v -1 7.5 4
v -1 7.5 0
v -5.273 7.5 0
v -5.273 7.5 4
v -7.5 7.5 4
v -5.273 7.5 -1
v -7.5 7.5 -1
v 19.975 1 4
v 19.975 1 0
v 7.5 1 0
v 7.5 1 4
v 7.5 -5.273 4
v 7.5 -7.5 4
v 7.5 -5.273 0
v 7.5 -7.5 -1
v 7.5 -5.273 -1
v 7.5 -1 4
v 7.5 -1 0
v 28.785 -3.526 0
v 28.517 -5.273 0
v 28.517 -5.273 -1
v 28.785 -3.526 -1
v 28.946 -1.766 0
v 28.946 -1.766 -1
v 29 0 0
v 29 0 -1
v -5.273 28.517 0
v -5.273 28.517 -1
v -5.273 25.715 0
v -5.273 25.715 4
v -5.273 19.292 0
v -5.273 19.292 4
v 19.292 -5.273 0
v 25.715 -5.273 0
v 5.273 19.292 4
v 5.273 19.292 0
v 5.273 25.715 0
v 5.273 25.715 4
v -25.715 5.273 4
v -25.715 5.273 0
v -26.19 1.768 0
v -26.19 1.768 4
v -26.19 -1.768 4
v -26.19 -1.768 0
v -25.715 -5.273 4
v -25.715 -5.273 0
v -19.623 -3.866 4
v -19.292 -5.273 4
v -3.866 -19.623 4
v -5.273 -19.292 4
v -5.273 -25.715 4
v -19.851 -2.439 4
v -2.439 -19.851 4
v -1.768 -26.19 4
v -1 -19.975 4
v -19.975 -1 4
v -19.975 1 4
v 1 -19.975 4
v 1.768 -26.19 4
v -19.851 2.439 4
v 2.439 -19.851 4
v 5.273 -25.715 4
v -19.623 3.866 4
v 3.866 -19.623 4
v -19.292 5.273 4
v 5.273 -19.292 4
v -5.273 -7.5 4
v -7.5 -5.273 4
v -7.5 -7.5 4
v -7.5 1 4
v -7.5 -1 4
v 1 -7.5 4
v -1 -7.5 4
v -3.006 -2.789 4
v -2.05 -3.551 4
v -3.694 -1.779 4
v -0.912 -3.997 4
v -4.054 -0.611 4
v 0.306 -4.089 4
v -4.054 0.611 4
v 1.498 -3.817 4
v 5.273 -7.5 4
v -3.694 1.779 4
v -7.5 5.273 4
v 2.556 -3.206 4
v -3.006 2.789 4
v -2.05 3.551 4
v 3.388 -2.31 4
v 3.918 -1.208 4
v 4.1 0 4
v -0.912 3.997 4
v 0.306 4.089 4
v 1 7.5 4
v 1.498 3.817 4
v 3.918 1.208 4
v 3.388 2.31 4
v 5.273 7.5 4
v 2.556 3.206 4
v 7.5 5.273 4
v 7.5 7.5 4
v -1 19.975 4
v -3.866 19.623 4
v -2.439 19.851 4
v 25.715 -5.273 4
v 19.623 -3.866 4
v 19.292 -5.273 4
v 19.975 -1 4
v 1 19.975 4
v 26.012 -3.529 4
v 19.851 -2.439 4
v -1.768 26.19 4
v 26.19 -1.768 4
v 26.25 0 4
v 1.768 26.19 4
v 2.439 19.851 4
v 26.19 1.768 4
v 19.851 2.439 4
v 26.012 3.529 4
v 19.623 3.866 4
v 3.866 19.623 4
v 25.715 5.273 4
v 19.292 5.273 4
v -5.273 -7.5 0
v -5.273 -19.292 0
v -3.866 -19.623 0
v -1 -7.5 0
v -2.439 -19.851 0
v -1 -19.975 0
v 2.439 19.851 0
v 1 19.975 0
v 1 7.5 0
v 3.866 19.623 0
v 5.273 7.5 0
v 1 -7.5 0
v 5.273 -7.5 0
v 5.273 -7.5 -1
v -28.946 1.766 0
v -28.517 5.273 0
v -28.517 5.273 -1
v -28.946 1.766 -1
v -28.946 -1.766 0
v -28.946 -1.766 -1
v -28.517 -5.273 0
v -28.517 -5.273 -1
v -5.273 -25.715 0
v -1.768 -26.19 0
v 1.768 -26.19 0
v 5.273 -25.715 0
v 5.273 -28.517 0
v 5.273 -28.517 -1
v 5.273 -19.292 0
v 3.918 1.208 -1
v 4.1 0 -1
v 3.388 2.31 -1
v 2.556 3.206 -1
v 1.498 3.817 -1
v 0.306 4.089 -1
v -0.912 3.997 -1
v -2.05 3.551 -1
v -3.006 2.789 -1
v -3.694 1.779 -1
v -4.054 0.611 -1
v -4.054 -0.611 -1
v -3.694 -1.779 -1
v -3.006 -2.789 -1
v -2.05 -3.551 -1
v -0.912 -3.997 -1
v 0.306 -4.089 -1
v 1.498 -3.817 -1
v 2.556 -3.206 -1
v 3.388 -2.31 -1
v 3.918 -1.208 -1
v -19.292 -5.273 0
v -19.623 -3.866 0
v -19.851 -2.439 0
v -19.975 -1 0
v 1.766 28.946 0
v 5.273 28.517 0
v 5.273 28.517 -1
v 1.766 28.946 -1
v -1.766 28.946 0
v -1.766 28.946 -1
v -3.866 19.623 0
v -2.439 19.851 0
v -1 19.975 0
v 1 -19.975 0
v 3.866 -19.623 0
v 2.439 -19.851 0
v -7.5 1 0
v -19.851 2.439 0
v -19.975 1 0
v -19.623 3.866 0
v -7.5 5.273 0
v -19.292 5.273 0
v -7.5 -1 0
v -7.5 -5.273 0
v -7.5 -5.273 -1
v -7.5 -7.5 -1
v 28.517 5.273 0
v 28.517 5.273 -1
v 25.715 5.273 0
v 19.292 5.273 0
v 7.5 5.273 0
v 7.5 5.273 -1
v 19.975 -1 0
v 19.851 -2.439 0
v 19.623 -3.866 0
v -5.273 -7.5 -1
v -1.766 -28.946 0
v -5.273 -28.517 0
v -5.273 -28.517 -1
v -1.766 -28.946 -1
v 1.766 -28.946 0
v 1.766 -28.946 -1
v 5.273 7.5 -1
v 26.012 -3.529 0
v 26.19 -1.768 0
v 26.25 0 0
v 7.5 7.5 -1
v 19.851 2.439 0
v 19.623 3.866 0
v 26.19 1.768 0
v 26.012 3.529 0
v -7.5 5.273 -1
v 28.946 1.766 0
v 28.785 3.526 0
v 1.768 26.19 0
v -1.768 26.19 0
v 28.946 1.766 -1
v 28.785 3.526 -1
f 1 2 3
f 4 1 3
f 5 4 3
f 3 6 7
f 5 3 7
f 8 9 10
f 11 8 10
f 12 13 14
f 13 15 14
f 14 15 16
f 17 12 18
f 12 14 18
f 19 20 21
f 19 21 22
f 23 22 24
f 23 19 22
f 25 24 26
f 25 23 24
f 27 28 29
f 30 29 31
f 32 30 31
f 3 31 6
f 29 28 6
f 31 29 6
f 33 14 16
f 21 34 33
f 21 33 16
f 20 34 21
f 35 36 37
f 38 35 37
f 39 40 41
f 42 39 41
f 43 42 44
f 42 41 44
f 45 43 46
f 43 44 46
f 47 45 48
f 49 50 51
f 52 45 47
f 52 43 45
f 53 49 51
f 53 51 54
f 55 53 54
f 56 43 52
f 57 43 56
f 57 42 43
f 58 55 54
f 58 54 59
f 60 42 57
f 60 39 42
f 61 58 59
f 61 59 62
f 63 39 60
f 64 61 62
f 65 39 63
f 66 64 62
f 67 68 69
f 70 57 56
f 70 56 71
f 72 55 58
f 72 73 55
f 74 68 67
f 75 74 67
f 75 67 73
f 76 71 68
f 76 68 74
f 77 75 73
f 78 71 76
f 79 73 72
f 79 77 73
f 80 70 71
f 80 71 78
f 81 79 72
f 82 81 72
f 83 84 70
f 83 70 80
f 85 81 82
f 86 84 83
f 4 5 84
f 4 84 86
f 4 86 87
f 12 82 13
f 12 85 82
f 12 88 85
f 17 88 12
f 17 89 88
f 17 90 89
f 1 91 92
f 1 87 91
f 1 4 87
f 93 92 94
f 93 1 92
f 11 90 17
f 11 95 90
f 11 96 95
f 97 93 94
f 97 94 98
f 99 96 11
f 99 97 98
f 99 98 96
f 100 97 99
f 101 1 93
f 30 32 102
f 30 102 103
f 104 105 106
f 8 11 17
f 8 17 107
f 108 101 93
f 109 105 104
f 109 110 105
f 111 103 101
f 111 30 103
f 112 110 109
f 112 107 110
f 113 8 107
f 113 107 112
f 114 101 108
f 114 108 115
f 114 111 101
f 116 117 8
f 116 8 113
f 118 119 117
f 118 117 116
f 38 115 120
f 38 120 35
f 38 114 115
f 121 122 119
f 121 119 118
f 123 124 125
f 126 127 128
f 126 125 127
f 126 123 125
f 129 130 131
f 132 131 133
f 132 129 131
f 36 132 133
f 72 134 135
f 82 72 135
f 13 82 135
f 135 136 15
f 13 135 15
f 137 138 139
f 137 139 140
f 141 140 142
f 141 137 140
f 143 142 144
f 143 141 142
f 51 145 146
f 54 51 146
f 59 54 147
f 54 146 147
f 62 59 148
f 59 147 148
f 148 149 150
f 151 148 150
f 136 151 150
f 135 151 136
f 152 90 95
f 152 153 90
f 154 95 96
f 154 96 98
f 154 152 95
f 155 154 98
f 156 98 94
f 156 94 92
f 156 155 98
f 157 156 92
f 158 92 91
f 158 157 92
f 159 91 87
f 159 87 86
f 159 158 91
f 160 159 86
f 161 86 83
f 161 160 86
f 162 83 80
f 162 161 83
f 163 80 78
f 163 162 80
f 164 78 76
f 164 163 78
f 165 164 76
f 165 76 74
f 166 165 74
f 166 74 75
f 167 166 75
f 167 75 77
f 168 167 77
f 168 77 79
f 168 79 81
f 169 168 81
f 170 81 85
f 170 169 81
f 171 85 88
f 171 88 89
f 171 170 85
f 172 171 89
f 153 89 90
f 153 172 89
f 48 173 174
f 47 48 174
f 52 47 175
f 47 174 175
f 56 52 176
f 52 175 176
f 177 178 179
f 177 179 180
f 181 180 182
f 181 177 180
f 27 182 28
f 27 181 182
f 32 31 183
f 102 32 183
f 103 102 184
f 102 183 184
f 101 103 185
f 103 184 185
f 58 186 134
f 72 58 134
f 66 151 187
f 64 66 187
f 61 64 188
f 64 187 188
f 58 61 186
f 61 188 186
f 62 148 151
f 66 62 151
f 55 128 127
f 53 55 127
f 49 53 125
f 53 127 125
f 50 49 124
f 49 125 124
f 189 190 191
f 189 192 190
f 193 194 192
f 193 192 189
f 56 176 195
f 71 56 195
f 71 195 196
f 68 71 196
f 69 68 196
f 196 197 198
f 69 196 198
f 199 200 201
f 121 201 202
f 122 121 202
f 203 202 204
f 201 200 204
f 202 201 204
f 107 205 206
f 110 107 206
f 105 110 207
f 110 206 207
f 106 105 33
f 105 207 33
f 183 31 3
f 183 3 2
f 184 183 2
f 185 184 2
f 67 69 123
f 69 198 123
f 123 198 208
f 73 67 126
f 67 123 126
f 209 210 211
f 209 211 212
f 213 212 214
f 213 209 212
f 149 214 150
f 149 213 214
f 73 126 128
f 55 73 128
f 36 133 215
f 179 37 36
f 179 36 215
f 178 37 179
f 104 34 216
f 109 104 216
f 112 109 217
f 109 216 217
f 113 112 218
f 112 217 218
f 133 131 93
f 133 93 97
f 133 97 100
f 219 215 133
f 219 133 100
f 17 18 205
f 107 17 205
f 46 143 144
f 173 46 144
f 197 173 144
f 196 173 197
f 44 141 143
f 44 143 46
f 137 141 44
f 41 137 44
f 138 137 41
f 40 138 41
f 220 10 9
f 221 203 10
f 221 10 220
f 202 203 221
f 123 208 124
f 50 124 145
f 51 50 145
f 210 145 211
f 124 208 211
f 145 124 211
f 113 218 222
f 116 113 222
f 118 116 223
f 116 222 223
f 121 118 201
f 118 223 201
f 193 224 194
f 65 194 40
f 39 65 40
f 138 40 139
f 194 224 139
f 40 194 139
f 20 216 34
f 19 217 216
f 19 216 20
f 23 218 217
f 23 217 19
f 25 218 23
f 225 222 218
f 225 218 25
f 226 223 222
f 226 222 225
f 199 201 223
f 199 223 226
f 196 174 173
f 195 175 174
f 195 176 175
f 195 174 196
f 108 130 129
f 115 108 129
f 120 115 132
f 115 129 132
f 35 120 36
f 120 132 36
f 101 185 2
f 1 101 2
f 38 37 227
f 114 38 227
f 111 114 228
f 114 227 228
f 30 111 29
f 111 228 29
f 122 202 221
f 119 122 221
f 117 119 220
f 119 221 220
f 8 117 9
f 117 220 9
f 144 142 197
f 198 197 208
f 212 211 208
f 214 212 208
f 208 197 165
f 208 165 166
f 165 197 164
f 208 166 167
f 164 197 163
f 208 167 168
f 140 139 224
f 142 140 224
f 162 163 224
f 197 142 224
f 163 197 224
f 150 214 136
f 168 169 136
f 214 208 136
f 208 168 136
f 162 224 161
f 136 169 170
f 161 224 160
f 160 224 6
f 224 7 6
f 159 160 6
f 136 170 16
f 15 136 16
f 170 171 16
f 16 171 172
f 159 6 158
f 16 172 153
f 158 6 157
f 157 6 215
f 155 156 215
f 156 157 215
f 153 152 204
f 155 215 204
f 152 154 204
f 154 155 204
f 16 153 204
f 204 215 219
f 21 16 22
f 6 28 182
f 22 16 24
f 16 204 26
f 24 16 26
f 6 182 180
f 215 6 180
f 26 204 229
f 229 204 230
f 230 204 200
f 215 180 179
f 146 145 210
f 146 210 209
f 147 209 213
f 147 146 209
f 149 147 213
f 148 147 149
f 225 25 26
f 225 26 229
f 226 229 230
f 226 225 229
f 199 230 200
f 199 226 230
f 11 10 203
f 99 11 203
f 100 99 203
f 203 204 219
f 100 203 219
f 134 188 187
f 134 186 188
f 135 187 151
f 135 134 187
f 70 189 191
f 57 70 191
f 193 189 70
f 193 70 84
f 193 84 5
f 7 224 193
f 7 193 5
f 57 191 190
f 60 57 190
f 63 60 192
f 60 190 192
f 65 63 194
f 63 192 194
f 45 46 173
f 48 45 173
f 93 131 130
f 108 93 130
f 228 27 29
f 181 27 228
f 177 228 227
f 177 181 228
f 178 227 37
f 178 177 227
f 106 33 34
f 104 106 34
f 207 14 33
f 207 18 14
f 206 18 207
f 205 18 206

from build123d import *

# Parameters (mm, degrees)
F0_R     = 4.1
F0_W     = 2.2272727273
F0_H     = 2.2272727273
F1_DEPTH = 1
F2_DEPTH = 4


with BuildPart() as f1:
    # F0 (on Top) → F1 (new body)
    with BuildSketch(Plane.XY):
        with BuildLine():
            Line((5.2727272727, 19.292442746), (5.2727272727, 25.7149926523))
            ThreePointArc((5.2727272727, 25.7149926523), (0, 26.25), (-5.2727272727, 25.7149926523))
            Line((-5.2727272727, 25.7149926523), (-5.2727272727, 19.292442746))
            ThreePointArc((-5.2727272727, 19.292442746), (-3.1548760073, 19.7496014486), (-1, 19.9749843554))
            ThreePointArc((-1, 19.9749843554), (0, 20), (1, 19.9749843554))
            ThreePointArc((1, 19.9749843554), (3.1548760073, 19.7496014486), (5.2727272727, 19.292442746))
        make_face()
        with BuildLine():
            ThreePointArc((-25.7149926523, -5.2727272727), (-26.25, 0), (-25.7149926523, 5.2727272727))
            Line((-25.7149926523, 5.2727272727), (-28.516632815, 5.2727272727))
            ThreePointArc((-28.516632815, 5.2727272727), (-29, 0), (-28.516632815, -5.2727272727))
            Line((-28.516632815, -5.2727272727), (-25.7149926523, -5.2727272727))
        make_face()
        with BuildLine():
            ThreePointArc((-5.2727272727, 25.7149926523), (0, 26.25), (5.2727272727, 25.7149926523))
            Line((5.2727272727, 25.7149926523), (5.2727272727, 28.516632815))
            ThreePointArc((5.2727272727, 28.516632815), (0, 29), (-5.2727272727, 28.516632815))
            Line((-5.2727272727, 28.516632815), (-5.2727272727, 25.7149926523))
        make_face()
        with BuildLine():
            ThreePointArc((25.7149926523, 5.2727272727), (26.1159056623, 2.6499002696), (26.25, 0))
            ThreePointArc((26.25, 0), (26.1159056623, -2.6499002696), (25.7149926523, -5.2727272727))
            Line((25.7149926523, -5.2727272727), (28.516632815, -5.2727272727))
            ThreePointArc((28.516632815, -5.2727272727), (28.8789053778, -2.6474183995), (29, 0))
            ThreePointArc((29, 0), (28.8789053778, 2.6474183995), (28.516632815, 5.2727272727))
            Line((28.516632815, 5.2727272727), (25.7149926523, 5.2727272727))
        make_face()
        with BuildLine():
            Line((5.2727272727, -28.516632815), (5.2727272727, -25.7149926523))
            ThreePointArc((5.2727272727, -25.7149926523), (0, -26.25), (-5.2727272727, -25.7149926523))
            Line((-5.2727272727, -25.7149926523), (-5.2727272727, -28.516632815))
            ThreePointArc((-5.2727272727, -28.516632815), (0, -29), (5.2727272727, -28.516632815))
        make_face()
        with BuildLine():
            Line((-7.5, 5.2727272727), (-19.292442746, 5.2727272727))
            ThreePointArc((-19.292442746, 5.2727272727), (-19.7496014486, 3.1548760073), (-19.9749843554, 1))
            Line((-19.9749843554, 1), (-7.5, 1))
            Line((-7.5, 1), (-7.5, 5.2727272727))
        make_face()
        Polygon((7.5, 1), (7.5, 5.2727272727), (5.2727272727, 5.2727272727), (5.2727272727, 7.5), (1, 7.5), (-1, 7.5), (-5.2727272727, 7.5), (-5.2727272727, 5.2727272727), (-7.5, 5.2727272727), (-7.5, 1), (-7.5, -1), (-7.5, -5.2727272727), (-5.2727272727, -5.2727272727), (-5.2727272727, -7.5), (-1, -7.5), (1, -7.5), (5.2727272727, -7.5), (5.2727272727, -5.2727272727), (7.5, -5.2727272727), (7.5, -1), align=None)
        Circle(F0_R, mode=Mode.SUBTRACT)
        with BuildLine():
            ThreePointArc((-1, 19.9749843554), (-3.1548760073, 19.7496014486), (-5.2727272727, 19.292442746))
            Line((-5.2727272727, 19.292442746), (-5.2727272727, 7.5))
            Line((-5.2727272727, 7.5), (-1, 7.5))
            Line((-1, 7.5), (-1, 19.9749843554))
        make_face()
        with BuildLine():
            ThreePointArc((19.9749843554, 1), (19.7496014486, 3.1548760073), (19.292442746, 5.2727272727))
            Line((19.292442746, 5.2727272727), (7.5, 5.2727272727))
            Line((7.5, 5.2727272727), (7.5, 1))
            Line((7.5, 1), (19.9749843554, 1))
        make_face()
        with BuildLine():
            ThreePointArc((25.7149926523, -5.2727272727), (26.1159056623, -2.6499002696), (26.25, 0))
            ThreePointArc((26.25, 0), (26.1159056623, 2.6499002696), (25.7149926523, 5.2727272727))
            Line((25.7149926523, 5.2727272727), (19.292442746, 5.2727272727))
            ThreePointArc((19.292442746, 5.2727272727), (19.7496014486, 3.1548760073), (19.9749843554, 1))
            ThreePointArc((19.9749843554, 1), (19.9937451108, 0.5001564212), (20, 0))
            ThreePointArc((20, 0), (19.9937451108, -0.5001564212), (19.9749843554, -1))
            ThreePointArc((19.9749843554, -1), (19.7496014486, -3.1548760073), (19.292442746, -5.2727272727))
            Line((19.292442746, -5.2727272727), (25.7149926523, -5.2727272727))
        make_face()
        with BuildLine():
            Line((-5.2727272727, -7.5), (-5.2727272727, -19.292442746))
            ThreePointArc((-5.2727272727, -19.292442746), (-3.1548760073, -19.7496014486), (-1, -19.9749843554))
            Line((-1, -19.9749843554), (-1, -7.5))
            Line((-1, -7.5), (-5.2727272727, -7.5))
        make_face()
        with BuildLine():
            ThreePointArc((-5.2727272727, -25.7149926523), (0, -26.25), (5.2727272727, -25.7149926523))
            Line((5.2727272727, -25.7149926523), (5.2727272727, -19.292442746))
            ThreePointArc((5.2727272727, -19.292442746), (3.1548760073, -19.7496014486), (1, -19.9749843554))
            ThreePointArc((1, -19.9749843554), (0, -20), (-1, -19.9749843554))
            ThreePointArc((-1, -19.9749843554), (-3.1548760073, -19.7496014486), (-5.2727272727, -19.292442746))
            Line((-5.2727272727, -19.292442746), (-5.2727272727, -25.7149926523))
        make_face()
        with BuildLine():
            Line((-19.292442746, 5.2727272727), (-25.7149926523, 5.2727272727))
            ThreePointArc((-25.7149926523, 5.2727272727), (-26.25, 0), (-25.7149926523, -5.2727272727))
            Line((-25.7149926523, -5.2727272727), (-19.292442746, -5.2727272727))
            ThreePointArc((-19.292442746, -5.2727272727), (-19.7496014486, -3.1548760073), (-19.9749843554, -1))
            ThreePointArc((-19.9749843554, -1), (-20, 0), (-19.9749843554, 1))
            ThreePointArc((-19.9749843554, 1), (-19.7496014486, 3.1548760073), (-19.292442746, 5.2727272727))
        make_face()
        with Locations((-6.3863636364, 6.3863636364)):
            Rectangle(F0_W, F0_H)
        with Locations((-6.3863636364, -6.3863636364)):
            Rectangle(F0_W, F0_H)
        with Locations((6.3863636364, -6.3863636364)):
            Rectangle(F0_W, F0_H)
        with Locations((6.3863636364, 6.3863636364)):
            Rectangle(F0_W, F0_H)
        with BuildLine():
            ThreePointArc((20, 0), (19.9937451108, 0.5001564212), (19.9749843554, 1))
            Line((19.9749843554, 1), (7.5, 1))
            Line((7.5, 1), (7.5, -1))
            Line((7.5, -1), (19.9749843554, -1))
            ThreePointArc((19.9749843554, -1), (19.9937451108, -0.5001564212), (20, 0))
        make_face()
        with BuildLine():
            Line((7.5, -5.2727272727), (19.292442746, -5.2727272727))
            ThreePointArc((19.292442746, -5.2727272727), (19.7496014486, -3.1548760073), (19.9749843554, -1))
            Line((19.9749843554, -1), (7.5, -1))
            Line((7.5, -1), (7.5, -5.2727272727))
        make_face()
        with BuildLine():
            ThreePointArc((-19.9749843554, -1), (-19.7496014486, -3.1548760073), (-19.292442746, -5.2727272727))
            Line((-19.292442746, -5.2727272727), (-7.5, -5.2727272727))
            Line((-7.5, -5.2727272727), (-7.5, -1))
            Line((-7.5, -1), (-19.9749843554, -1))
        make_face()
        with BuildLine():
            Line((-7.5, 1), (-19.9749843554, 1))
            ThreePointArc((-19.9749843554, 1), (-20, 0), (-19.9749843554, -1))
            Line((-19.9749843554, -1), (-7.5, -1))
            Line((-7.5, -1), (-7.5, 1))
        make_face()
        with BuildLine():
            Line((1, 7.5), (1, 19.9749843554))
            ThreePointArc((1, 19.9749843554), (0, 20), (-1, 19.9749843554))
            Line((-1, 19.9749843554), (-1, 7.5))
            Line((-1, 7.5), (1, 7.5))
        make_face()
        with BuildLine():
            Line((5.2727272727, 7.5), (5.2727272727, 19.292442746))
            ThreePointArc((5.2727272727, 19.292442746), (3.1548760073, 19.7496014486), (1, 19.9749843554))
            Line((1, 19.9749843554), (1, 7.5))
            Line((1, 7.5), (5.2727272727, 7.5))
        make_face()
        with BuildLine():
            ThreePointArc((1, -19.9749843554), (3.1548760073, -19.7496014486), (5.2727272727, -19.292442746))
            Line((5.2727272727, -19.292442746), (5.2727272727, -7.5))
            Line((5.2727272727, -7.5), (1, -7.5))
            Line((1, -7.5), (1, -19.9749843554))
        make_face()
        with BuildLine():
            ThreePointArc((-1, -19.9749843554), (0, -20), (1, -19.9749843554))
            Line((1, -19.9749843554), (1, -7.5))
            Line((1, -7.5), (-1, -7.5))
            Line((-1, -7.5), (-1, -19.9749843554))
        make_face()
    extrude(amount=-F1_DEPTH)

    # F0 (on Top) → F2 (join)
    with BuildSketch(Plane.XY):
        with BuildLine():
            ThreePointArc((25.7149926523, -5.2727272727), (26.1159056623, -2.6499002696), (26.25, 0))
            ThreePointArc((26.25, 0), (26.1159056623, 2.6499002696), (25.7149926523, 5.2727272727))
            Line((25.7149926523, 5.2727272727), (19.292442746, 5.2727272727))
            ThreePointArc((19.292442746, 5.2727272727), (19.7496014486, 3.1548760073), (19.9749843554, 1))
            ThreePointArc((19.9749843554, 1), (19.9937451108, 0.5001564212), (20, 0))
            ThreePointArc((20, 0), (19.9937451108, -0.5001564212), (19.9749843554, -1))
            ThreePointArc((19.9749843554, -1), (19.7496014486, -3.1548760073), (19.292442746, -5.2727272727))
            Line((19.292442746, -5.2727272727), (25.7149926523, -5.2727272727))
        make_face()
        with BuildLine():
            Line((5.2727272727, 19.292442746), (5.2727272727, 25.7149926523))
            ThreePointArc((5.2727272727, 25.7149926523), (0, 26.25), (-5.2727272727, 25.7149926523))
            Line((-5.2727272727, 25.7149926523), (-5.2727272727, 19.292442746))
            ThreePointArc((-5.2727272727, 19.292442746), (-3.1548760073, 19.7496014486), (-1, 19.9749843554))
            ThreePointArc((-1, 19.9749843554), (0, 20), (1, 19.9749843554))
            ThreePointArc((1, 19.9749843554), (3.1548760073, 19.7496014486), (5.2727272727, 19.292442746))
        make_face()
        with BuildLine():
            Line((-19.292442746, 5.2727272727), (-25.7149926523, 5.2727272727))
            ThreePointArc((-25.7149926523, 5.2727272727), (-26.25, 0), (-25.7149926523, -5.2727272727))
            Line((-25.7149926523, -5.2727272727), (-19.292442746, -5.2727272727))
            ThreePointArc((-19.292442746, -5.2727272727), (-19.7496014486, -3.1548760073), (-19.9749843554, -1))
            ThreePointArc((-19.9749843554, -1), (-20, 0), (-19.9749843554, 1))
            ThreePointArc((-19.9749843554, 1), (-19.7496014486, 3.1548760073), (-19.292442746, 5.2727272727))
        make_face()
        with BuildLine():
            ThreePointArc((-5.2727272727, -25.7149926523), (0, -26.25), (5.2727272727, -25.7149926523))
            Line((5.2727272727, -25.7149926523), (5.2727272727, -19.292442746))
            ThreePointArc((5.2727272727, -19.292442746), (3.1548760073, -19.7496014486), (1, -19.9749843554))
            ThreePointArc((1, -19.9749843554), (0, -20), (-1, -19.9749843554))
            ThreePointArc((-1, -19.9749843554), (-3.1548760073, -19.7496014486), (-5.2727272727, -19.292442746))
            Line((-5.2727272727, -19.292442746), (-5.2727272727, -25.7149926523))
        make_face()
        with BuildLine():
            Line((1, 7.5), (1, 19.9749843554))
            ThreePointArc((1, 19.9749843554), (0, 20), (-1, 19.9749843554))
            Line((-1, 19.9749843554), (-1, 7.5))
            Line((-1, 7.5), (1, 7.5))
        make_face()
        with BuildLine():
            Line((-7.5, 1), (-19.9749843554, 1))
            ThreePointArc((-19.9749843554, 1), (-20, 0), (-19.9749843554, -1))
            Line((-19.9749843554, -1), (-7.5, -1))
            Line((-7.5, -1), (-7.5, 1))
        make_face()
        with BuildLine():
            ThreePointArc((20, 0), (19.9937451108, 0.5001564212), (19.9749843554, 1))
            Line((19.9749843554, 1), (7.5, 1))
            Line((7.5, 1), (7.5, -1))
            Line((7.5, -1), (19.9749843554, -1))
            ThreePointArc((19.9749843554, -1), (19.9937451108, -0.5001564212), (20, 0))
        make_face()
        with BuildLine():
            ThreePointArc((-1, -19.9749843554), (0, -20), (1, -19.9749843554))
            Line((1, -19.9749843554), (1, -7.5))
            Line((1, -7.5), (-1, -7.5))
            Line((-1, -7.5), (-1, -19.9749843554))
        make_face()
        Polygon((7.5, 1), (7.5, 5.2727272727), (5.2727272727, 5.2727272727), (5.2727272727, 7.5), (1, 7.5), (-1, 7.5), (-5.2727272727, 7.5), (-5.2727272727, 5.2727272727), (-7.5, 5.2727272727), (-7.5, 1), (-7.5, -1), (-7.5, -5.2727272727), (-5.2727272727, -5.2727272727), (-5.2727272727, -7.5), (-1, -7.5), (1, -7.5), (5.2727272727, -7.5), (5.2727272727, -5.2727272727), (7.5, -5.2727272727), (7.5, -1), align=None)
        Circle(F0_R, mode=Mode.SUBTRACT)
        with Locations((-6.3863636364, 6.3863636364)):
            Rectangle(F0_W, F0_H)
        with Locations((-6.3863636364, -6.3863636364)):
            Rectangle(F0_W, F0_H)
        with Locations((6.3863636364, -6.3863636364)):
            Rectangle(F0_W, F0_H)
        with Locations((6.3863636364, 6.3863636364)):
            Rectangle(F0_W, F0_H)
    extrude(amount=F2_DEPTH)


solid = f1.part
